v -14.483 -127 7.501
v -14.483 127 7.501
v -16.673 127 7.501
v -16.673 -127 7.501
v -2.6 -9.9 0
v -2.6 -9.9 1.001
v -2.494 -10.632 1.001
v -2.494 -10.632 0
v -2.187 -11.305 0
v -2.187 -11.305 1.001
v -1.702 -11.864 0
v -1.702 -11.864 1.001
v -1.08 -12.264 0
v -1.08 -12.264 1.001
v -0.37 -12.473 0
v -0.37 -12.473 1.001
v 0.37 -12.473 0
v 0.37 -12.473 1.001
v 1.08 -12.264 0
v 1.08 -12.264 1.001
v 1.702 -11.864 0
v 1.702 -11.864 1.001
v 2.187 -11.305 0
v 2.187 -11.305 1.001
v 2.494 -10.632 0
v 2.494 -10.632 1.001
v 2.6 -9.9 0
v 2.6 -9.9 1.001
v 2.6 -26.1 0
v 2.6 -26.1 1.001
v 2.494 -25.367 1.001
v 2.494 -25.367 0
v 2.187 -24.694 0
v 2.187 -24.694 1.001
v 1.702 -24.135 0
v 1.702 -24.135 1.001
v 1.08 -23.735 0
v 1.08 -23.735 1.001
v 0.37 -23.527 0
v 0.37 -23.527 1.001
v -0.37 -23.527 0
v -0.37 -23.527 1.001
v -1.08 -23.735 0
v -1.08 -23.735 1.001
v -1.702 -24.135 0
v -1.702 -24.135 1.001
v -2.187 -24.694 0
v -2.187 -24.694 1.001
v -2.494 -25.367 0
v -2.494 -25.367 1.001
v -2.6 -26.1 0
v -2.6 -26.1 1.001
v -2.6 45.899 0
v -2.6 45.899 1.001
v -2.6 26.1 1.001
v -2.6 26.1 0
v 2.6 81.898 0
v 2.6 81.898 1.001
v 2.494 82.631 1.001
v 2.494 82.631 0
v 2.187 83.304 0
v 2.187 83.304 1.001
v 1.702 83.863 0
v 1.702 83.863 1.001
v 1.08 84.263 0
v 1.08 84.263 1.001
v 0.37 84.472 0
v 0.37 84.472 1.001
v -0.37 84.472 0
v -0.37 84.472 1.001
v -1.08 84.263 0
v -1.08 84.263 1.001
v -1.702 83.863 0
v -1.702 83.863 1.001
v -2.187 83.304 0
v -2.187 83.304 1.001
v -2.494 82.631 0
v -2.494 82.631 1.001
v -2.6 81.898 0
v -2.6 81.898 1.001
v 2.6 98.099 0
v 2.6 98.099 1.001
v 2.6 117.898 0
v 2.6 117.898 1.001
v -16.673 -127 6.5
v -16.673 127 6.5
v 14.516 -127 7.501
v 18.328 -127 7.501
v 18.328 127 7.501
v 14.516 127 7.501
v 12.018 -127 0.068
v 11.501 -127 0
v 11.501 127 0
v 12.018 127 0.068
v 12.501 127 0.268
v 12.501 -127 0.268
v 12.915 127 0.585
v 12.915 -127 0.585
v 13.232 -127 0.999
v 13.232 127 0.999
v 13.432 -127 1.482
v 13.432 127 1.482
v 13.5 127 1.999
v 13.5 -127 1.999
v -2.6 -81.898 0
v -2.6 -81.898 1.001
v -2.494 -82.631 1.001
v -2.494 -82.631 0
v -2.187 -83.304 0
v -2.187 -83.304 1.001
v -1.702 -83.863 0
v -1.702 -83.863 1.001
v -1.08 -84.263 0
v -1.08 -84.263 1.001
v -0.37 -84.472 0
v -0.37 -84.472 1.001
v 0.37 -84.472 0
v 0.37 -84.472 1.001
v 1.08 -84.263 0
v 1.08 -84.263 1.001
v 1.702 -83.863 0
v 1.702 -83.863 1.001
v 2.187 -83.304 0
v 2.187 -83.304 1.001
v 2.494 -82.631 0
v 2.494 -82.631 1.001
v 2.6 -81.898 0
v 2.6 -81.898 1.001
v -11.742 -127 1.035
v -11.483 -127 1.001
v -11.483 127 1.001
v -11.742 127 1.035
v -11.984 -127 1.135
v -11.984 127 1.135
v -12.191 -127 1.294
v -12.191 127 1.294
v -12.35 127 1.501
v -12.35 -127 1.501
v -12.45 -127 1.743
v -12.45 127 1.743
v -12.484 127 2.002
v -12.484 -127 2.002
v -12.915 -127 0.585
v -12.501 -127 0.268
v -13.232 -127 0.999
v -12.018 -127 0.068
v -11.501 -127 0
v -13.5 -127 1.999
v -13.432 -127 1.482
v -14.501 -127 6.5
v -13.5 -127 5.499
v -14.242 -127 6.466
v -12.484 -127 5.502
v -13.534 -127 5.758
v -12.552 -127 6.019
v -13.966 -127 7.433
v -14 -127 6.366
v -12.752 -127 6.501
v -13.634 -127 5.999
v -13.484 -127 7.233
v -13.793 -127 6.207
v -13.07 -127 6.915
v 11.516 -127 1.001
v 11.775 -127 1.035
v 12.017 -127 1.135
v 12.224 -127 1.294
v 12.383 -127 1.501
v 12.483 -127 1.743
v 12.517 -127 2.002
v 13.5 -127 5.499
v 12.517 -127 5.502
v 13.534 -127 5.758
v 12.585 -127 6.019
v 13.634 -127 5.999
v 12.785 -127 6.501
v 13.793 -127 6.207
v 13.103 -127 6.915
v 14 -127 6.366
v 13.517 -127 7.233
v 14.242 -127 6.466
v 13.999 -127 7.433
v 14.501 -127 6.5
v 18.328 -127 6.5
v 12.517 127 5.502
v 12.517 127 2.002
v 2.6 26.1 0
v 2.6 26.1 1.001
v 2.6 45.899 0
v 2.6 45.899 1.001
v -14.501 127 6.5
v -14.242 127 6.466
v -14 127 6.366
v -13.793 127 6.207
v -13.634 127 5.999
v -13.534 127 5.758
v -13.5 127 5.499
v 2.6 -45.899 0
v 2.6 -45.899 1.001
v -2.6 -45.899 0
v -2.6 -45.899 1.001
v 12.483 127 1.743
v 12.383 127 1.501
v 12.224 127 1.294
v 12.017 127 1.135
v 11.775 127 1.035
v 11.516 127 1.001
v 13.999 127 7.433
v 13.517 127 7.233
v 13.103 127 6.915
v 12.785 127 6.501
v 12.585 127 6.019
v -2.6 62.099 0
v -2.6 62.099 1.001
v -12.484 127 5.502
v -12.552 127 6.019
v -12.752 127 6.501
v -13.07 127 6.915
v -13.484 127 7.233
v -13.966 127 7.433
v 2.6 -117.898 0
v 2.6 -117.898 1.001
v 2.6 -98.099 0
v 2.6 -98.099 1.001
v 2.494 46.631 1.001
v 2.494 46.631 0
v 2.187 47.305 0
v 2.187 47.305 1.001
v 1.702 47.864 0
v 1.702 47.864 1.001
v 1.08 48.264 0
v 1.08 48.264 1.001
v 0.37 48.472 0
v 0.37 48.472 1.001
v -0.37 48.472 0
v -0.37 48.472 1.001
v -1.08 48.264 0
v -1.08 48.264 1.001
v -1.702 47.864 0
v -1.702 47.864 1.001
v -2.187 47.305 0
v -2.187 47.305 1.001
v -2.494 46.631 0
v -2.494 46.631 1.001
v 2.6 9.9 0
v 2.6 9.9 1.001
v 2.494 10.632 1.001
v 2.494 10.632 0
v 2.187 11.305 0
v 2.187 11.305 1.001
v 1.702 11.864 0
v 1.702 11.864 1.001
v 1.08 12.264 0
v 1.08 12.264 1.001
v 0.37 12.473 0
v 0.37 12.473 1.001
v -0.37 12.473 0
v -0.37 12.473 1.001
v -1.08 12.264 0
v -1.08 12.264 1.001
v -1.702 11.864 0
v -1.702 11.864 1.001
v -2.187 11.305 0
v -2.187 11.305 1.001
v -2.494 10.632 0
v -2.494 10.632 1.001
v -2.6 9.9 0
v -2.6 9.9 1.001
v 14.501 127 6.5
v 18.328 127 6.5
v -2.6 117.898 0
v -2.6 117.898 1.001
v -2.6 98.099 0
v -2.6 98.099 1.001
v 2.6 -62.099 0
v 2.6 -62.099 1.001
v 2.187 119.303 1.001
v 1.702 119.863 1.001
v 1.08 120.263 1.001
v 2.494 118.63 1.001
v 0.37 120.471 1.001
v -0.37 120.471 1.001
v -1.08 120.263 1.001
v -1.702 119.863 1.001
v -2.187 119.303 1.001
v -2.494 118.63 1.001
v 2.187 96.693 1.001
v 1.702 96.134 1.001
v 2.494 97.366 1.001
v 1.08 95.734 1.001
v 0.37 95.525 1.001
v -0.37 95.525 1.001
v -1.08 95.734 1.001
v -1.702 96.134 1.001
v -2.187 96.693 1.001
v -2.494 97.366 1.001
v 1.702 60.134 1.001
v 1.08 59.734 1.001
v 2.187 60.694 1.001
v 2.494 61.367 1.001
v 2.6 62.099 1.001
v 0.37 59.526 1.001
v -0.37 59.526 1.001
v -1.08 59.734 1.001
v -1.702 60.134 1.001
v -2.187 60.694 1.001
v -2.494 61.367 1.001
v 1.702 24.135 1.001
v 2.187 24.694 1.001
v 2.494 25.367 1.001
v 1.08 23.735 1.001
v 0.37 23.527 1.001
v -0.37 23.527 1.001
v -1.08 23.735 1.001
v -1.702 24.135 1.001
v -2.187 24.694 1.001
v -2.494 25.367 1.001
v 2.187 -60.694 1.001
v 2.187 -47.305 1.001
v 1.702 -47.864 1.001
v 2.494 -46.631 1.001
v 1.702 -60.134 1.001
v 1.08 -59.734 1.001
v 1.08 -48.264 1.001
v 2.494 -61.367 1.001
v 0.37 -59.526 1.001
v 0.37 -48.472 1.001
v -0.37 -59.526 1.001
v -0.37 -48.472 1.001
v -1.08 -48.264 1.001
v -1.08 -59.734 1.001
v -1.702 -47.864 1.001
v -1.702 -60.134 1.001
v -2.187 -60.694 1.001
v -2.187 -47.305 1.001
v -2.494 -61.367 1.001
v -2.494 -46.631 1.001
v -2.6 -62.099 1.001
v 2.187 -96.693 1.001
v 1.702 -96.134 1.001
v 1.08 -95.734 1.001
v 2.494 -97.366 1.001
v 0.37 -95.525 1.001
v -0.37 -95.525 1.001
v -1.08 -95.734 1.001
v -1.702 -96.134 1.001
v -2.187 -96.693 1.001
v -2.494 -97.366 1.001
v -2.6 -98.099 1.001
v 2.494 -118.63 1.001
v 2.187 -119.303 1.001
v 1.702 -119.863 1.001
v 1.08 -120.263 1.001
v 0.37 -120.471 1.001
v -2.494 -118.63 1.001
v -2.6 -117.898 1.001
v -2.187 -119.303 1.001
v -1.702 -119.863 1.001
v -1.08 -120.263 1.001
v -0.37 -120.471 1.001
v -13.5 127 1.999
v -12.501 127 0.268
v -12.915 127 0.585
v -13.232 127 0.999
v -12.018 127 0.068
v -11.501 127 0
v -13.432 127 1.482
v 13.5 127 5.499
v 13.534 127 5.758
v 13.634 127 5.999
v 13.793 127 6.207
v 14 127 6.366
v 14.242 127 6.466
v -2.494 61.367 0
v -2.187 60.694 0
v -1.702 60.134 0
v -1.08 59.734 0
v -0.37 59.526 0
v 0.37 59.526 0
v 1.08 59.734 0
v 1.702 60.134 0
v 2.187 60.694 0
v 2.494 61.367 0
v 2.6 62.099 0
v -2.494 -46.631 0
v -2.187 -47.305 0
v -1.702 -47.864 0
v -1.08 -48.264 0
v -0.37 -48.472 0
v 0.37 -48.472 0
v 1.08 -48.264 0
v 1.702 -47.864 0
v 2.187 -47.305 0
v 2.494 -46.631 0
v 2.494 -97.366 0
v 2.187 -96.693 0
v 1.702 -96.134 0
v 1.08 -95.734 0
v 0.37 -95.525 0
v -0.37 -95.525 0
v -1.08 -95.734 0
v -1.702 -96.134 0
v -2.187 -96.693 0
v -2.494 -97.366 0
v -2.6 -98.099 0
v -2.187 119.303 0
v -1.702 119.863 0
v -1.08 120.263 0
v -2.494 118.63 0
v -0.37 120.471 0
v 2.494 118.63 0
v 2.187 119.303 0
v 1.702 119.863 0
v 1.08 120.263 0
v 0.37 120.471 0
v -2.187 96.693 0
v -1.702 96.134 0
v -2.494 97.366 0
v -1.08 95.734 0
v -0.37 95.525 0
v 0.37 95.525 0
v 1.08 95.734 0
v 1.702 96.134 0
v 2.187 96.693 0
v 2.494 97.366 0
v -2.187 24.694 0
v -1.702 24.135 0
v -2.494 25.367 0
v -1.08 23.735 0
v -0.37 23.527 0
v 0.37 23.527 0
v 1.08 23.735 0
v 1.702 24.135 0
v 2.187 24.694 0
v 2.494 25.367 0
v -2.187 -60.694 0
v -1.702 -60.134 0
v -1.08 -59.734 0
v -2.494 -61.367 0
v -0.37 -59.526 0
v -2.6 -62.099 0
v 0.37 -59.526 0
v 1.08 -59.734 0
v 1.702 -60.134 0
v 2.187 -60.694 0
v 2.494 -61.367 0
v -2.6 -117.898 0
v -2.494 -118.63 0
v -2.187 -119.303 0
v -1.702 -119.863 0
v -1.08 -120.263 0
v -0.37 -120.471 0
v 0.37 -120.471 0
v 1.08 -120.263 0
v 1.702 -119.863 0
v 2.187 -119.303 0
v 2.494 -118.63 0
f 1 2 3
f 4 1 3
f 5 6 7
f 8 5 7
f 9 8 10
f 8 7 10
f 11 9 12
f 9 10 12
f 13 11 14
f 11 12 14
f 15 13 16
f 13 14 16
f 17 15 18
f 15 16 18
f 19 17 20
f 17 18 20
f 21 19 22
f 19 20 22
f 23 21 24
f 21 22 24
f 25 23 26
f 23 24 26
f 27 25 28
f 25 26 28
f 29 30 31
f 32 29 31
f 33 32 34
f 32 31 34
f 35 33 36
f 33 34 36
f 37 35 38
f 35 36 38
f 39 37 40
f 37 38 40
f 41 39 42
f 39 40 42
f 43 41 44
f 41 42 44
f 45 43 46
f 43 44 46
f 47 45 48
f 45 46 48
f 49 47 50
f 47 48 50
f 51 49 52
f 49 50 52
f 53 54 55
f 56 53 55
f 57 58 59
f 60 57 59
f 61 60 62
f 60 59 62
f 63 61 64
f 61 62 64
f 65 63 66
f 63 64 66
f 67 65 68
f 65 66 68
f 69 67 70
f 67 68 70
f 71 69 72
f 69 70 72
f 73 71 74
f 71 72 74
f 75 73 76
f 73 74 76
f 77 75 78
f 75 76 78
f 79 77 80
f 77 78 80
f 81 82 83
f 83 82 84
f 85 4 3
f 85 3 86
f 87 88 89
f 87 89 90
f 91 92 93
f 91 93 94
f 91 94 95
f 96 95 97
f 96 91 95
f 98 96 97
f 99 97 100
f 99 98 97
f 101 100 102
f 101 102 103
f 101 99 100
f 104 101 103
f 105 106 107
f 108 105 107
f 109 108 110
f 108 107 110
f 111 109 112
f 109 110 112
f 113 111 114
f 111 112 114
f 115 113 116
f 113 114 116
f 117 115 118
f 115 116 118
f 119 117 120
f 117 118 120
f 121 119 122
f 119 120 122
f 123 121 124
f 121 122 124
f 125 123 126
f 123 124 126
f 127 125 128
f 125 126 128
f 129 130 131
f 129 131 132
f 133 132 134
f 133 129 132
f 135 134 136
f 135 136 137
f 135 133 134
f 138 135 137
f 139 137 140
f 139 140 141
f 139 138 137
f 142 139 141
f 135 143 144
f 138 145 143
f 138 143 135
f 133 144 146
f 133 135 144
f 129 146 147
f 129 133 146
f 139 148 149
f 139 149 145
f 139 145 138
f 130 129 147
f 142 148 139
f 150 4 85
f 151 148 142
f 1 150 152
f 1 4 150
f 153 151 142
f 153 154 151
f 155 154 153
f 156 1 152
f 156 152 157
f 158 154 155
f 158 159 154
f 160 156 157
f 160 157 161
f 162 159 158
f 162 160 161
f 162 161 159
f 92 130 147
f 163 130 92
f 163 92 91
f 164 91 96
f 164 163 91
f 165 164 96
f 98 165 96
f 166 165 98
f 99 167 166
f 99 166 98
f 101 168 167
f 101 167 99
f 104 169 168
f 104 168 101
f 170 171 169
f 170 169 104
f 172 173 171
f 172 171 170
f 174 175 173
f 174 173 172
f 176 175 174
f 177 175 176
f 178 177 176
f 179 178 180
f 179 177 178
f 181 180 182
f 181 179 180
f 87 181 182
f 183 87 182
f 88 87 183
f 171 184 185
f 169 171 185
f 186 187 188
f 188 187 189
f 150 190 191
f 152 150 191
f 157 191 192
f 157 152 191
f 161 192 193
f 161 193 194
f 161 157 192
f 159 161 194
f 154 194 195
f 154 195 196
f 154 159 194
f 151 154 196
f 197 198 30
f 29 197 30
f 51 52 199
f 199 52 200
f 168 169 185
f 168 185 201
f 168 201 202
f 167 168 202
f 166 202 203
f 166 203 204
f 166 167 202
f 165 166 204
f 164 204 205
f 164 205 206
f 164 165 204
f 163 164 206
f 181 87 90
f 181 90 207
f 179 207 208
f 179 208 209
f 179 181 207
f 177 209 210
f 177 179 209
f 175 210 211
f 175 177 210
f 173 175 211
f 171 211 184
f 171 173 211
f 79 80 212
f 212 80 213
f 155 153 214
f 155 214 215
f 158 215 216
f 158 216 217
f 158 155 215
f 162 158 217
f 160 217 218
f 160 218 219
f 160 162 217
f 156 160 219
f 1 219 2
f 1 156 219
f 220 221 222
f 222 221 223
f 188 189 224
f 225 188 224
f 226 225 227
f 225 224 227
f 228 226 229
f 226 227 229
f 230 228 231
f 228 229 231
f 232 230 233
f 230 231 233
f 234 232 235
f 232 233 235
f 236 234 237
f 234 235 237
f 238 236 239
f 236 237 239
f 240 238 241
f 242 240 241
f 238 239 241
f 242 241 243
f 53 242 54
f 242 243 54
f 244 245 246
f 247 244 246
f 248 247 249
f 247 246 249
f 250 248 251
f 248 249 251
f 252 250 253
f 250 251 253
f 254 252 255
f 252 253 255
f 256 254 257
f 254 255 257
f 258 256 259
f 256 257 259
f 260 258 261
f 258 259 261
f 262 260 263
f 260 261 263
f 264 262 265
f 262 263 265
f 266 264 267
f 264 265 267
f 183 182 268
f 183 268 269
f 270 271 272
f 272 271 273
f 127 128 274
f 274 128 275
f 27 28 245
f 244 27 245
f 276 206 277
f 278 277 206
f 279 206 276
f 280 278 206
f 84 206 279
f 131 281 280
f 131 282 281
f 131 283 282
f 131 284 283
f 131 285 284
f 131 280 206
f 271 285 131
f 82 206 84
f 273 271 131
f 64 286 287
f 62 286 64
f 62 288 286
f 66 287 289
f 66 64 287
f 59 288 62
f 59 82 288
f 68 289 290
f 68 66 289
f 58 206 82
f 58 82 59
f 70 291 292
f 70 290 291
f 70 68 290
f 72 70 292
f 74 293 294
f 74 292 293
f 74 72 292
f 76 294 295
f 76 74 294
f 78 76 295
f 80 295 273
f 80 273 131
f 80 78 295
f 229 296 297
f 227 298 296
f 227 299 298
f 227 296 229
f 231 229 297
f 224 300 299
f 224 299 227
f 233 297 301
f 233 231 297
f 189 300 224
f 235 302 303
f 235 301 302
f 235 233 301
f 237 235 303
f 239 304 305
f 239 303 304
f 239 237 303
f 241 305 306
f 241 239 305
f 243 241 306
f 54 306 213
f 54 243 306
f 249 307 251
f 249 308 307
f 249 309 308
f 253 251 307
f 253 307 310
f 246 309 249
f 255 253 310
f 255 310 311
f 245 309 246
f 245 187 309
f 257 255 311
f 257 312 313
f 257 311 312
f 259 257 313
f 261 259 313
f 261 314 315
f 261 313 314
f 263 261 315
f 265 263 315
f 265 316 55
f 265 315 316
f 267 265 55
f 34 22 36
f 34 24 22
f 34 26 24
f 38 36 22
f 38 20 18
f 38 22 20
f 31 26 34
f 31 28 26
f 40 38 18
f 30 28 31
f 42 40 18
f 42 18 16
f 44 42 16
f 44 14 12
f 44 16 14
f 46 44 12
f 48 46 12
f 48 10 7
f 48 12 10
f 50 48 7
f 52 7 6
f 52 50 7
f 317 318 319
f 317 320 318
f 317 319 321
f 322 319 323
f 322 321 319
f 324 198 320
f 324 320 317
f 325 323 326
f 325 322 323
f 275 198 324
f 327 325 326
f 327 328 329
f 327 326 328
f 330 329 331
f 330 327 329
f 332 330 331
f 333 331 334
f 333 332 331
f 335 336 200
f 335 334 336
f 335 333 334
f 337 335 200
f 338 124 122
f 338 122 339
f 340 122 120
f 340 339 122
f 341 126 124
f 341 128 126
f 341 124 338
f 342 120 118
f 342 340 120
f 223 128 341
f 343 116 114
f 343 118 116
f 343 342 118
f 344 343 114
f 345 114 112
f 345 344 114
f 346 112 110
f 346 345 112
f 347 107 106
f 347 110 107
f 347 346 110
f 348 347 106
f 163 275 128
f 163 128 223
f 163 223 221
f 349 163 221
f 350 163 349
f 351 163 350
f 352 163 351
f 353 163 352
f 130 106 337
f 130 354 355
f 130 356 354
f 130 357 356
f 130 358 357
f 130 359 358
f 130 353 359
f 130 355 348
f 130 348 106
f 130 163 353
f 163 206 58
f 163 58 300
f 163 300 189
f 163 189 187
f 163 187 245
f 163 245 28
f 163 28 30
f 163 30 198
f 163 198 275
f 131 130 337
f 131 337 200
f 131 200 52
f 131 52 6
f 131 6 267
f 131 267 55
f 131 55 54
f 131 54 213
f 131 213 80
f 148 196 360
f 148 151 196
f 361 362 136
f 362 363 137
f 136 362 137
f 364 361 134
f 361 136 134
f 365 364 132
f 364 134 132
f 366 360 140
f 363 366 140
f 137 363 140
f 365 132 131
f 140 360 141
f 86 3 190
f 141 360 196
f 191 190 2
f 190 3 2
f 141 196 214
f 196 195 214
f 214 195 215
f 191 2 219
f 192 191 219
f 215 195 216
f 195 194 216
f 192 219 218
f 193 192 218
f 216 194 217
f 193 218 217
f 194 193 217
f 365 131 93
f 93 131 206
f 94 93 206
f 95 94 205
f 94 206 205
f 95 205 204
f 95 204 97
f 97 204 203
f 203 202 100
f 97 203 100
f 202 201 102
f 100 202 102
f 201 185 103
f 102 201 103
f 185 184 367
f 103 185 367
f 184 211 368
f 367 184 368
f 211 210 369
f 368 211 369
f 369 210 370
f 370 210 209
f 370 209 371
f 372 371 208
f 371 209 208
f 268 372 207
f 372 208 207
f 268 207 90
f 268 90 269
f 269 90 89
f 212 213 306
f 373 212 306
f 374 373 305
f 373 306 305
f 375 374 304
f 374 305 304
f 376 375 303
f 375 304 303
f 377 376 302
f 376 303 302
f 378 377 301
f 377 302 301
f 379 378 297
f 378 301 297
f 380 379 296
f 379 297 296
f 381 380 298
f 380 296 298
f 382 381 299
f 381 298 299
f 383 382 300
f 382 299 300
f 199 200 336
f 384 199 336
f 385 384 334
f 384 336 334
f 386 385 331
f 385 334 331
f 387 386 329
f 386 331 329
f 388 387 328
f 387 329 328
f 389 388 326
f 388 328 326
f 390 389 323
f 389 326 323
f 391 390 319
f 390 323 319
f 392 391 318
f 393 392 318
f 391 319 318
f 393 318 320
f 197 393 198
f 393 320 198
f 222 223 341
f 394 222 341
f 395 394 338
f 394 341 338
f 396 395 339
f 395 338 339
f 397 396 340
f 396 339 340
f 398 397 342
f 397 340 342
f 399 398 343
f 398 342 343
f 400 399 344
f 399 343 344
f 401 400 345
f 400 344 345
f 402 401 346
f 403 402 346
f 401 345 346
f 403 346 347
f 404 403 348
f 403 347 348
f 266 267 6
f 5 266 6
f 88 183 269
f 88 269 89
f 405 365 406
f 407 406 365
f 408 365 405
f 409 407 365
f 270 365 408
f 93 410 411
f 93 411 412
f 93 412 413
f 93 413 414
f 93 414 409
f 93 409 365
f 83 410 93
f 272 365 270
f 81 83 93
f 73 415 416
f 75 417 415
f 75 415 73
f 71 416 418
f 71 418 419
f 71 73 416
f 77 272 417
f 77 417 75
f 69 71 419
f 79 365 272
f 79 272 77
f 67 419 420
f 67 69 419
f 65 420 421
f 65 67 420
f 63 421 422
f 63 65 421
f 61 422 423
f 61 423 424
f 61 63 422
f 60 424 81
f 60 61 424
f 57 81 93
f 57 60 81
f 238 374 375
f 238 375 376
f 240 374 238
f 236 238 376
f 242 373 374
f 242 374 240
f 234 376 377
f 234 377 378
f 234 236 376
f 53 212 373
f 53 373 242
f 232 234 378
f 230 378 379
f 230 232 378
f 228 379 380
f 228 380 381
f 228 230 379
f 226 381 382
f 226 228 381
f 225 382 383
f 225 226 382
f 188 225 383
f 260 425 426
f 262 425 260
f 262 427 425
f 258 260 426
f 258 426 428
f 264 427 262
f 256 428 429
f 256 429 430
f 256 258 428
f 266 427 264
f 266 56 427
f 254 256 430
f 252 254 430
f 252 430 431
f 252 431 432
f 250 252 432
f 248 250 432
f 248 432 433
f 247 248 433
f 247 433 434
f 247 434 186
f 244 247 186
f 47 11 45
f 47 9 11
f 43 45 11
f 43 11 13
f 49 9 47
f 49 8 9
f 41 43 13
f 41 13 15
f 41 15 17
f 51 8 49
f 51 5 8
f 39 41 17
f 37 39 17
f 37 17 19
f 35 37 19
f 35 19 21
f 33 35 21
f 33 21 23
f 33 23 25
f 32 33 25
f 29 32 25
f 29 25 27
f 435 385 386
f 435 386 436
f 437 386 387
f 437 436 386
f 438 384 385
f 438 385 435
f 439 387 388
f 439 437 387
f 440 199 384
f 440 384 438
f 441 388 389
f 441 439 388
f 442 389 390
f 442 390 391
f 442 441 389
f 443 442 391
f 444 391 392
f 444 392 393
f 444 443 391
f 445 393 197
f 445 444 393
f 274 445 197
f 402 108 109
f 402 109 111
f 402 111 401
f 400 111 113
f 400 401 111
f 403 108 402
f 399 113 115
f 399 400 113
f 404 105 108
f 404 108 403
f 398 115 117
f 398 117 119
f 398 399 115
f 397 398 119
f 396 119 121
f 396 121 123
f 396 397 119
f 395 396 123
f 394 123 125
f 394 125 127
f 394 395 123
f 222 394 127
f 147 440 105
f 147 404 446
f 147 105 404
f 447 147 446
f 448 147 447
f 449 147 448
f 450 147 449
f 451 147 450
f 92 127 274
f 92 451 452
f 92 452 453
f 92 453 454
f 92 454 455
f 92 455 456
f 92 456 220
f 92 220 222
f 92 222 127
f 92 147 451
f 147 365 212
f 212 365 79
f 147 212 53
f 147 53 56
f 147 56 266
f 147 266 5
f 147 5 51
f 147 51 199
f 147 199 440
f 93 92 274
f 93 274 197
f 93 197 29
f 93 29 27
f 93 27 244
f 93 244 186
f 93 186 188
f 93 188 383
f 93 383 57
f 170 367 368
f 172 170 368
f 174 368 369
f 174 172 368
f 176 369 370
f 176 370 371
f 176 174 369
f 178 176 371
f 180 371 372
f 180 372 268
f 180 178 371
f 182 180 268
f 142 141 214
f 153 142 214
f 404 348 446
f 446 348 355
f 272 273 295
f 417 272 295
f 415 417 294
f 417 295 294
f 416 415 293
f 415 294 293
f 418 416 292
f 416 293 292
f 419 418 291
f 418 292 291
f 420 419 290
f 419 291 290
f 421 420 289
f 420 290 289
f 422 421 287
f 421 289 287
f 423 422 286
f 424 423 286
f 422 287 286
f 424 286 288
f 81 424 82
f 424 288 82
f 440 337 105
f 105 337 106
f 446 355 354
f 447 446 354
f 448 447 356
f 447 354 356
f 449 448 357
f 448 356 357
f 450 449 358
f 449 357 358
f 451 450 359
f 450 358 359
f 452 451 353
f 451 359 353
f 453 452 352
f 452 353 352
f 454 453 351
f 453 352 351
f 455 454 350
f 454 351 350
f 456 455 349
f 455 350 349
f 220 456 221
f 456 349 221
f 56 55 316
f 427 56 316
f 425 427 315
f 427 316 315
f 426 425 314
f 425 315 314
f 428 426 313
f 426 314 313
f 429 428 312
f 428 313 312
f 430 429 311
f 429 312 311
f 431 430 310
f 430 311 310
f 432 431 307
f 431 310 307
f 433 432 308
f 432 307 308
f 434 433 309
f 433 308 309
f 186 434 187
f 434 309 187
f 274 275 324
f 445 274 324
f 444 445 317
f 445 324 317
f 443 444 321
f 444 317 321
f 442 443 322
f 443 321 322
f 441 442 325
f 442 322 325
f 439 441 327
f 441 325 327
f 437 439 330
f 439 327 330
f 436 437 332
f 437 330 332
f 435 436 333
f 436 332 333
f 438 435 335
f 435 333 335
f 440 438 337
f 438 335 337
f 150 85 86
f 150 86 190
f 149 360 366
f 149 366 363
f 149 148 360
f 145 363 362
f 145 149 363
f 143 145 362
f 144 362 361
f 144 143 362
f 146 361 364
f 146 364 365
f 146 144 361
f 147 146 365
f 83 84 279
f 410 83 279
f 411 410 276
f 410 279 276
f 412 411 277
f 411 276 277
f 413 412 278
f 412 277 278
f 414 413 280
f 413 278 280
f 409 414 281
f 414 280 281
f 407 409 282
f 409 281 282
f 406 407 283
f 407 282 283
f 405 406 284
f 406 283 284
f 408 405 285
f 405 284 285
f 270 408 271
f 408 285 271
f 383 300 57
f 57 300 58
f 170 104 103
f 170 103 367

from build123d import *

# Parameters (mm, degrees)
F1_DEPTH = 127
F3_DEPTH = 1.00176


with BuildPart() as f1:
    # F0 (on Front) → F1 (new body, symmetric)
    with BuildSketch(Plane.XZ):
        with BuildLine():
            ThreePointArc((-13.5001, 1.99898), (-12.9146123135, 0.5854876865), (-11.50112, 0))
            Line((-11.50112, 0), (11.50112, 0))
            ThreePointArc((11.50112, 0), (12.9146123135, 0.5854876865), (13.5001, 1.99898))
            Line((13.5001, 1.99898), (13.5001, 5.4991))
            ThreePointArc((13.5001, 5.4991), (13.7932158177, 6.2067441823), (14.50086, 6.49986))
            Line((14.50086, 6.49986), (18.3281093243, 6.49986))
            Line((18.3281093243, 6.49986), (18.3281093243, 7.50062))
            Line((18.3281093243, 7.50062), (14.5161, 7.50062))
            ThreePointArc((14.5161, 7.50062), (13.1026076865, 6.9151323135), (12.51712, 5.50164))
            Line((12.51712, 5.50164), (12.51712, 2.00152))
            ThreePointArc((12.51712, 2.00152), (12.2240041823, 1.2938758177), (11.51636, 1.00076))
            Line((11.51636, 1.00076), (-11.48334, 1.00076))
            ThreePointArc((-11.48334, 1.00076), (-12.1909841823, 1.2938758177), (-12.4841, 2.00152))
            Line((-12.4841, 2.00152), (-12.4841, 5.50164))
            ThreePointArc((-12.4841, 5.50164), (-13.0695876865, 6.9151323135), (-14.48308, 7.50062))
            Line((-14.48308, 7.50062), (-16.6730906757, 7.50062))
            Line((-16.6730906757, 7.50062), (-16.6730906757, 6.49986))
            Line((-16.6730906757, 6.49986), (-14.50086, 6.49986))
            ThreePointArc((-14.50086, 6.49986), (-13.7932158177, 6.2067441823), (-13.5001, 5.4991))
            Line((-13.5001, 5.4991), (-13.5001, 1.99898))
        make_face()
    extrude(amount=F1_DEPTH, both=True)

    # F2 (on face) → F3 (cut, through all)
    with BuildSketch(Plane.XY.offset(1.00076)):
        with BuildLine():
            ThreePointArc((2.59969, 9.89965), (0, 12.49934), (-2.59969, 9.89965))
            Line((-2.59969, 9.89965), (-2.59969, -9.89965))
            ThreePointArc((-2.59969, -9.89965), (0, -12.49934), (2.59969, -9.89965))
            Line((2.59969, -9.89965), (2.59969, 9.89965))
        make_face()
        with BuildLine():
            ThreePointArc((-2.59969, 26.09977), (0, 23.50008), (2.59969, 26.09977))
            Line((2.59969, 26.09977), (2.59969, 45.89907))
            ThreePointArc((2.59969, 45.89907), (0, 48.49876), (-2.59969, 45.89907))
            Line((-2.59969, 45.89907), (-2.59969, 26.09977))
        make_face()
        with BuildLine():
            ThreePointArc((-2.59969, 62.09919), (0, 59.4995), (2.59969, 62.09919))
            Line((2.59969, 62.09919), (2.59969, 81.89849))
            ThreePointArc((2.59969, 81.89849), (0, 84.49818), (-2.59969, 81.89849))
            Line((-2.59969, 81.89849), (-2.59969, 62.09919))
        make_face()
        with BuildLine():
            ThreePointArc((-2.59969, 98.09861), (0, 95.49892), (2.59969, 98.09861))
            Line((2.59969, 98.09861), (2.59969, 117.89791))
            ThreePointArc((2.59969, 117.89791), (0, 120.4976), (-2.59969, 117.89791))
            Line((-2.59969, 117.89791), (-2.59969, 98.09861))
        make_face()
        with BuildLine():
            ThreePointArc((-2.59969, -45.89907), (0, -48.49876), (2.59969, -45.89907))
            Line((2.59969, -45.89907), (2.59969, -26.09977))
            ThreePointArc((2.59969, -26.09977), (0, -23.50008), (-2.59969, -26.09977))
            Line((-2.59969, -26.09977), (-2.59969, -45.89907))
        make_face()
        with BuildLine():
            ThreePointArc((-2.59969, -81.89849), (0, -84.49818), (2.59969, -81.89849))
            Line((2.59969, -81.89849), (2.59969, -62.09919))
            ThreePointArc((2.59969, -62.09919), (0, -59.4995), (-2.59969, -62.09919))
            Line((-2.59969, -62.09919), (-2.59969, -81.89849))
        make_face()
        with BuildLine():
            ThreePointArc((-2.59969, -117.89791), (0, -120.4976), (2.59969, -117.89791))
            Line((2.59969, -117.89791), (2.59969, -98.09861))
            ThreePointArc((2.59969, -98.09861), (0, -95.49892), (-2.59969, -98.09861))
            Line((-2.59969, -98.09861), (-2.59969, -117.89791))
        make_face()
    extrude(amount=-F3_DEPTH, mode=Mode.SUBTRACT)


solid = f1.part
